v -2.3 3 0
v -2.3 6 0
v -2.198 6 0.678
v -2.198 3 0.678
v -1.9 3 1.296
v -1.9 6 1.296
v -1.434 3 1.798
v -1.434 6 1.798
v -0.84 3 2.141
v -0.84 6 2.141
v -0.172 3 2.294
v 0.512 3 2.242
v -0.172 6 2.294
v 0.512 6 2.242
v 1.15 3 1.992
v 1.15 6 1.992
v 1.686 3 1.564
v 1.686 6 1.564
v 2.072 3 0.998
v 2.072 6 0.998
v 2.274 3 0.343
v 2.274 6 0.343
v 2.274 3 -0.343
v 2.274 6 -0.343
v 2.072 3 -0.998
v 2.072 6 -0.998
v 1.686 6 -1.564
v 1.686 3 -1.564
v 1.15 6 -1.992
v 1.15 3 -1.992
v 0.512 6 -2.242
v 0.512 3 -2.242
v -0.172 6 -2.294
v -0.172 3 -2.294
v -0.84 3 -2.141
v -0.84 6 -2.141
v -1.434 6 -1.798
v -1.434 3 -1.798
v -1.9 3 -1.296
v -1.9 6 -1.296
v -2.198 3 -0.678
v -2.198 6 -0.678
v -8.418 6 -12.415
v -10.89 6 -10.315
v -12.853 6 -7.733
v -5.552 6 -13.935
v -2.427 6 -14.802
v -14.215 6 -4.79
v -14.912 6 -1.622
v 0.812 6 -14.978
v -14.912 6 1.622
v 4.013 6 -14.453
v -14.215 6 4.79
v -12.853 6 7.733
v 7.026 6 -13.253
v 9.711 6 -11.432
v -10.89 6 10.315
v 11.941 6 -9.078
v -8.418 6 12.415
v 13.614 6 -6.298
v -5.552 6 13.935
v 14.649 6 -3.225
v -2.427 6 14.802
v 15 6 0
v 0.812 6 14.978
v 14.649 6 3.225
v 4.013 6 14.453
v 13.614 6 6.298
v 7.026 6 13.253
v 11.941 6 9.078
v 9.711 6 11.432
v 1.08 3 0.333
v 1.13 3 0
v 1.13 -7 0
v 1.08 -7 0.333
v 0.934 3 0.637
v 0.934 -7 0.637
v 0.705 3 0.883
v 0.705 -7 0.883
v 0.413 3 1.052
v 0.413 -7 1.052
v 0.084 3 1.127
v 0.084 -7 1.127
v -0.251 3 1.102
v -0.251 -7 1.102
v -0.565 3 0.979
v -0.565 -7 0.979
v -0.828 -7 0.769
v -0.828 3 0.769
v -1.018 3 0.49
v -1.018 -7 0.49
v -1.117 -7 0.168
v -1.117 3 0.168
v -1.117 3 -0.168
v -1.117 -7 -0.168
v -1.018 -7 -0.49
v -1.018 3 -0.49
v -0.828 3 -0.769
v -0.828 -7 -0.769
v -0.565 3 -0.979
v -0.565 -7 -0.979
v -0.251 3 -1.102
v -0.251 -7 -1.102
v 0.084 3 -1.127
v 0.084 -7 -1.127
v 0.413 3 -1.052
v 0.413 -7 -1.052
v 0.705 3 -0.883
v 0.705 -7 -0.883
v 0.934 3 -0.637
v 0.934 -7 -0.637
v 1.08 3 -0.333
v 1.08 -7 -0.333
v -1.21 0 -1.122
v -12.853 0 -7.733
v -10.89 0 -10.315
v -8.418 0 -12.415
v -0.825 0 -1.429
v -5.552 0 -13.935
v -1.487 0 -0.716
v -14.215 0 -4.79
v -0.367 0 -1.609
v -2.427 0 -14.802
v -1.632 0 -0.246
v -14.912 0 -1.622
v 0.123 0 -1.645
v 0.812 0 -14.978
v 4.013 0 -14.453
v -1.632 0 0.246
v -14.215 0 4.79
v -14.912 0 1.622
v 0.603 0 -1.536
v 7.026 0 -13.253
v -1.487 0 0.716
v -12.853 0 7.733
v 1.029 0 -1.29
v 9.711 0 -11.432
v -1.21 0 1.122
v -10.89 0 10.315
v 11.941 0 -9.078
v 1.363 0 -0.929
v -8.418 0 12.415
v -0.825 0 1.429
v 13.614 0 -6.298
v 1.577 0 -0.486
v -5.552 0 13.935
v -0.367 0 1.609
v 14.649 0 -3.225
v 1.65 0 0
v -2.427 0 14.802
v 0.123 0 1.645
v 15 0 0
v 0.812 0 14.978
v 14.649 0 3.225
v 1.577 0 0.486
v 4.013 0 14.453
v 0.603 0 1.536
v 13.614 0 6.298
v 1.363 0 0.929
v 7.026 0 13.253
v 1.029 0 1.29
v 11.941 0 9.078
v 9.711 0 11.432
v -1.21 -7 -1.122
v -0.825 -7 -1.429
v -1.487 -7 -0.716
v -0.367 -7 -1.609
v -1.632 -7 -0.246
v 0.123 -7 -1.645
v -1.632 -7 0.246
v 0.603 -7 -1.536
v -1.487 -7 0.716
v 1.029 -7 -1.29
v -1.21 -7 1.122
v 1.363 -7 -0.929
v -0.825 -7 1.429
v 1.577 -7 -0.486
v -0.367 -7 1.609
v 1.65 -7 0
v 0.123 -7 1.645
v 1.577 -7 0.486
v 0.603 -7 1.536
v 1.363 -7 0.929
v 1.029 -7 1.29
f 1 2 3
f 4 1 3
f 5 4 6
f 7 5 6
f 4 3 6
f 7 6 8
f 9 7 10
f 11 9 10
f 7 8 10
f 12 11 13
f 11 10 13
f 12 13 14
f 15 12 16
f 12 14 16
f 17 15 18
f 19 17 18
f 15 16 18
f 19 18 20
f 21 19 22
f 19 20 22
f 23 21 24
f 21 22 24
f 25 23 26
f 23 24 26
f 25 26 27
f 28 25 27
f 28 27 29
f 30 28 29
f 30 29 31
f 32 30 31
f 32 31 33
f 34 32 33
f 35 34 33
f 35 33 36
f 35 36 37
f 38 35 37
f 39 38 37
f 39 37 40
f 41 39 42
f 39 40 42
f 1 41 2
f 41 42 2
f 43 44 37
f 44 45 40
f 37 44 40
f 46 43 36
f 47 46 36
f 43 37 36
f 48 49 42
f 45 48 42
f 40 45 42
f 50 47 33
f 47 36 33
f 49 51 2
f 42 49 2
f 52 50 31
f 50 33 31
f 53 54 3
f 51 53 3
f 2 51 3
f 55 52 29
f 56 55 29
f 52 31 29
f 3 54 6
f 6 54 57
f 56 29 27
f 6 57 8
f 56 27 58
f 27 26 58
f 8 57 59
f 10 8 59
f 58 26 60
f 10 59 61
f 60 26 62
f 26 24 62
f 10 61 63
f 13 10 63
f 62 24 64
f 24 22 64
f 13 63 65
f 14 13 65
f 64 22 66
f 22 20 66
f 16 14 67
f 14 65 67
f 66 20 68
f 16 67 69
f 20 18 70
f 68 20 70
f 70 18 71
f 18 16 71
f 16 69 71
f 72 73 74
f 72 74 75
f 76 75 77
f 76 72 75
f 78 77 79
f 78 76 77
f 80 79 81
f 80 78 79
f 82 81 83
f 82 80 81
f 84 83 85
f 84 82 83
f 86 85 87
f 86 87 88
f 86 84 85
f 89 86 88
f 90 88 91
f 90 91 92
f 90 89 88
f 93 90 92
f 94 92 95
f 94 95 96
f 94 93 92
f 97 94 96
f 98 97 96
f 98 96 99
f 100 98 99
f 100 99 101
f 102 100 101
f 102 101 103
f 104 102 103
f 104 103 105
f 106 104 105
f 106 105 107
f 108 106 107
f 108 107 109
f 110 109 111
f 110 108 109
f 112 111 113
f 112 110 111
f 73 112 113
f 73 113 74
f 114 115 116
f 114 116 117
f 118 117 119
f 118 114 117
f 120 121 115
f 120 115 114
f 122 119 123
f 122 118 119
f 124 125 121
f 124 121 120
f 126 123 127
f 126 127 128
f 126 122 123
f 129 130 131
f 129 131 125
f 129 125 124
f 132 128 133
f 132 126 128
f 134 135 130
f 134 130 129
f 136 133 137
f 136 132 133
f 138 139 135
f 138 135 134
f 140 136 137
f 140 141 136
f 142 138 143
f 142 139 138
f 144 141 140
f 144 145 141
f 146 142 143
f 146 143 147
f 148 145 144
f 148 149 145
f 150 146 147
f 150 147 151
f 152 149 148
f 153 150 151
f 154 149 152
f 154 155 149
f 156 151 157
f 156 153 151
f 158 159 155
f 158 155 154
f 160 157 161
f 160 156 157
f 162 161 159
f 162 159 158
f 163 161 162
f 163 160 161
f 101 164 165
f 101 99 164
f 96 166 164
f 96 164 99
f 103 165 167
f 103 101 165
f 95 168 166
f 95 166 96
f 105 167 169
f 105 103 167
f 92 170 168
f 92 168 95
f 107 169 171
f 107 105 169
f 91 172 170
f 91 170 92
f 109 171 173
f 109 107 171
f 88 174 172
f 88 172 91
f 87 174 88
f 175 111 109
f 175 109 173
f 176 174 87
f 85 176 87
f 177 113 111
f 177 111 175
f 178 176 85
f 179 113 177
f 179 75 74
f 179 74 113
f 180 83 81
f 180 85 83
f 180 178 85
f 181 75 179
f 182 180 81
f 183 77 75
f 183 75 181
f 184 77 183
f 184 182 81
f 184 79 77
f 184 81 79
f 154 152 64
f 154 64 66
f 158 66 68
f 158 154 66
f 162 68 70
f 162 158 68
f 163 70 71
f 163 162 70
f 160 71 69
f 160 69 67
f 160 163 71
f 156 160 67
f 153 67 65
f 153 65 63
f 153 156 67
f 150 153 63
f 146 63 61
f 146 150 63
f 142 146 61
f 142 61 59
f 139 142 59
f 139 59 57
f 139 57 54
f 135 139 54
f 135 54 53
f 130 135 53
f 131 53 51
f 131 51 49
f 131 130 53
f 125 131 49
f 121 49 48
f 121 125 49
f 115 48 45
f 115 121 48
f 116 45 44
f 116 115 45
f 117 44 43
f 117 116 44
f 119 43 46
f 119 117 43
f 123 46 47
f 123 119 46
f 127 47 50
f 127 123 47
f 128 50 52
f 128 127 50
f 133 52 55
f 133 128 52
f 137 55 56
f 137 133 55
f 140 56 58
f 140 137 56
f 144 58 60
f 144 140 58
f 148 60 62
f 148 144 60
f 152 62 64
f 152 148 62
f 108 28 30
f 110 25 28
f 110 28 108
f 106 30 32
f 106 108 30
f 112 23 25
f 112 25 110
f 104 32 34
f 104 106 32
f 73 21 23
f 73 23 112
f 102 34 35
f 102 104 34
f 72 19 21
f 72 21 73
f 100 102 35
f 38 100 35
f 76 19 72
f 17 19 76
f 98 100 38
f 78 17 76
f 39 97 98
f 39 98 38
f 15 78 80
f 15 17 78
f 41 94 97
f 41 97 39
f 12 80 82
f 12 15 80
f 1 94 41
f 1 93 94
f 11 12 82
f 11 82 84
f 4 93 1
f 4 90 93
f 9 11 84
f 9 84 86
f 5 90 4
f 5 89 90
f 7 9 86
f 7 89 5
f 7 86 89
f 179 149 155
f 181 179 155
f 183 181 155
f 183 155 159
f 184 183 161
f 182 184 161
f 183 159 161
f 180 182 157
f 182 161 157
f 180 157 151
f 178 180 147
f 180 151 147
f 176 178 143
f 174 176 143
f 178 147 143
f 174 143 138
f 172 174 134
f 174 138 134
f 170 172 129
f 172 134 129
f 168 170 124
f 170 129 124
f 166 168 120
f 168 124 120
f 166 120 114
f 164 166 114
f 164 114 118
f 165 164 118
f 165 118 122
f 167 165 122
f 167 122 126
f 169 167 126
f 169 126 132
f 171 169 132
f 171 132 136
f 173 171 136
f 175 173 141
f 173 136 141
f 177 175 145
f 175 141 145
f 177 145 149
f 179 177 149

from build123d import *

# Parameters (mm, degrees)
F0_R     = 15
F0_R_2   = 2.3
F0_R_3   = 1.65
F0_R_4   = 1.13
F1_DEPTH = 6
F2_DEPTH = 7
F3_R     = 2.3
F3_R_2   = 1.13
F4_DEPTH = 3


with BuildPart() as f1:
    # F0 (on Front) → F1 (new body)
    with BuildSketch(Plane.XZ):
        Circle(F0_R)
        Circle(F0_R_2, mode=Mode.SUBTRACT)
        Circle(F0_R_2)
        Circle(F0_R_3, mode=Mode.SUBTRACT)
        Circle(F0_R_3)
        Circle(F0_R_4, mode=Mode.SUBTRACT)
    extrude(amount=-F1_DEPTH)

    # F0 (on Front) → F2 (join)
    with BuildSketch(Plane.XZ):
        Circle(F0_R_3)
        Circle(F0_R_4, mode=Mode.SUBTRACT)
    extrude(amount=F2_DEPTH)

    # F3 (on face) → F4 (cut)
    with BuildSketch(Plane(origin=(0, 6, 0), x_dir=(-1, 0, 0), z_dir=(0, 1, 0))):
        Circle(F3_R)
        Circle(F3_R_2, mode=Mode.SUBTRACT)
    extrude(amount=-F4_DEPTH, mode=Mode.SUBTRACT)


solid = f1.part
